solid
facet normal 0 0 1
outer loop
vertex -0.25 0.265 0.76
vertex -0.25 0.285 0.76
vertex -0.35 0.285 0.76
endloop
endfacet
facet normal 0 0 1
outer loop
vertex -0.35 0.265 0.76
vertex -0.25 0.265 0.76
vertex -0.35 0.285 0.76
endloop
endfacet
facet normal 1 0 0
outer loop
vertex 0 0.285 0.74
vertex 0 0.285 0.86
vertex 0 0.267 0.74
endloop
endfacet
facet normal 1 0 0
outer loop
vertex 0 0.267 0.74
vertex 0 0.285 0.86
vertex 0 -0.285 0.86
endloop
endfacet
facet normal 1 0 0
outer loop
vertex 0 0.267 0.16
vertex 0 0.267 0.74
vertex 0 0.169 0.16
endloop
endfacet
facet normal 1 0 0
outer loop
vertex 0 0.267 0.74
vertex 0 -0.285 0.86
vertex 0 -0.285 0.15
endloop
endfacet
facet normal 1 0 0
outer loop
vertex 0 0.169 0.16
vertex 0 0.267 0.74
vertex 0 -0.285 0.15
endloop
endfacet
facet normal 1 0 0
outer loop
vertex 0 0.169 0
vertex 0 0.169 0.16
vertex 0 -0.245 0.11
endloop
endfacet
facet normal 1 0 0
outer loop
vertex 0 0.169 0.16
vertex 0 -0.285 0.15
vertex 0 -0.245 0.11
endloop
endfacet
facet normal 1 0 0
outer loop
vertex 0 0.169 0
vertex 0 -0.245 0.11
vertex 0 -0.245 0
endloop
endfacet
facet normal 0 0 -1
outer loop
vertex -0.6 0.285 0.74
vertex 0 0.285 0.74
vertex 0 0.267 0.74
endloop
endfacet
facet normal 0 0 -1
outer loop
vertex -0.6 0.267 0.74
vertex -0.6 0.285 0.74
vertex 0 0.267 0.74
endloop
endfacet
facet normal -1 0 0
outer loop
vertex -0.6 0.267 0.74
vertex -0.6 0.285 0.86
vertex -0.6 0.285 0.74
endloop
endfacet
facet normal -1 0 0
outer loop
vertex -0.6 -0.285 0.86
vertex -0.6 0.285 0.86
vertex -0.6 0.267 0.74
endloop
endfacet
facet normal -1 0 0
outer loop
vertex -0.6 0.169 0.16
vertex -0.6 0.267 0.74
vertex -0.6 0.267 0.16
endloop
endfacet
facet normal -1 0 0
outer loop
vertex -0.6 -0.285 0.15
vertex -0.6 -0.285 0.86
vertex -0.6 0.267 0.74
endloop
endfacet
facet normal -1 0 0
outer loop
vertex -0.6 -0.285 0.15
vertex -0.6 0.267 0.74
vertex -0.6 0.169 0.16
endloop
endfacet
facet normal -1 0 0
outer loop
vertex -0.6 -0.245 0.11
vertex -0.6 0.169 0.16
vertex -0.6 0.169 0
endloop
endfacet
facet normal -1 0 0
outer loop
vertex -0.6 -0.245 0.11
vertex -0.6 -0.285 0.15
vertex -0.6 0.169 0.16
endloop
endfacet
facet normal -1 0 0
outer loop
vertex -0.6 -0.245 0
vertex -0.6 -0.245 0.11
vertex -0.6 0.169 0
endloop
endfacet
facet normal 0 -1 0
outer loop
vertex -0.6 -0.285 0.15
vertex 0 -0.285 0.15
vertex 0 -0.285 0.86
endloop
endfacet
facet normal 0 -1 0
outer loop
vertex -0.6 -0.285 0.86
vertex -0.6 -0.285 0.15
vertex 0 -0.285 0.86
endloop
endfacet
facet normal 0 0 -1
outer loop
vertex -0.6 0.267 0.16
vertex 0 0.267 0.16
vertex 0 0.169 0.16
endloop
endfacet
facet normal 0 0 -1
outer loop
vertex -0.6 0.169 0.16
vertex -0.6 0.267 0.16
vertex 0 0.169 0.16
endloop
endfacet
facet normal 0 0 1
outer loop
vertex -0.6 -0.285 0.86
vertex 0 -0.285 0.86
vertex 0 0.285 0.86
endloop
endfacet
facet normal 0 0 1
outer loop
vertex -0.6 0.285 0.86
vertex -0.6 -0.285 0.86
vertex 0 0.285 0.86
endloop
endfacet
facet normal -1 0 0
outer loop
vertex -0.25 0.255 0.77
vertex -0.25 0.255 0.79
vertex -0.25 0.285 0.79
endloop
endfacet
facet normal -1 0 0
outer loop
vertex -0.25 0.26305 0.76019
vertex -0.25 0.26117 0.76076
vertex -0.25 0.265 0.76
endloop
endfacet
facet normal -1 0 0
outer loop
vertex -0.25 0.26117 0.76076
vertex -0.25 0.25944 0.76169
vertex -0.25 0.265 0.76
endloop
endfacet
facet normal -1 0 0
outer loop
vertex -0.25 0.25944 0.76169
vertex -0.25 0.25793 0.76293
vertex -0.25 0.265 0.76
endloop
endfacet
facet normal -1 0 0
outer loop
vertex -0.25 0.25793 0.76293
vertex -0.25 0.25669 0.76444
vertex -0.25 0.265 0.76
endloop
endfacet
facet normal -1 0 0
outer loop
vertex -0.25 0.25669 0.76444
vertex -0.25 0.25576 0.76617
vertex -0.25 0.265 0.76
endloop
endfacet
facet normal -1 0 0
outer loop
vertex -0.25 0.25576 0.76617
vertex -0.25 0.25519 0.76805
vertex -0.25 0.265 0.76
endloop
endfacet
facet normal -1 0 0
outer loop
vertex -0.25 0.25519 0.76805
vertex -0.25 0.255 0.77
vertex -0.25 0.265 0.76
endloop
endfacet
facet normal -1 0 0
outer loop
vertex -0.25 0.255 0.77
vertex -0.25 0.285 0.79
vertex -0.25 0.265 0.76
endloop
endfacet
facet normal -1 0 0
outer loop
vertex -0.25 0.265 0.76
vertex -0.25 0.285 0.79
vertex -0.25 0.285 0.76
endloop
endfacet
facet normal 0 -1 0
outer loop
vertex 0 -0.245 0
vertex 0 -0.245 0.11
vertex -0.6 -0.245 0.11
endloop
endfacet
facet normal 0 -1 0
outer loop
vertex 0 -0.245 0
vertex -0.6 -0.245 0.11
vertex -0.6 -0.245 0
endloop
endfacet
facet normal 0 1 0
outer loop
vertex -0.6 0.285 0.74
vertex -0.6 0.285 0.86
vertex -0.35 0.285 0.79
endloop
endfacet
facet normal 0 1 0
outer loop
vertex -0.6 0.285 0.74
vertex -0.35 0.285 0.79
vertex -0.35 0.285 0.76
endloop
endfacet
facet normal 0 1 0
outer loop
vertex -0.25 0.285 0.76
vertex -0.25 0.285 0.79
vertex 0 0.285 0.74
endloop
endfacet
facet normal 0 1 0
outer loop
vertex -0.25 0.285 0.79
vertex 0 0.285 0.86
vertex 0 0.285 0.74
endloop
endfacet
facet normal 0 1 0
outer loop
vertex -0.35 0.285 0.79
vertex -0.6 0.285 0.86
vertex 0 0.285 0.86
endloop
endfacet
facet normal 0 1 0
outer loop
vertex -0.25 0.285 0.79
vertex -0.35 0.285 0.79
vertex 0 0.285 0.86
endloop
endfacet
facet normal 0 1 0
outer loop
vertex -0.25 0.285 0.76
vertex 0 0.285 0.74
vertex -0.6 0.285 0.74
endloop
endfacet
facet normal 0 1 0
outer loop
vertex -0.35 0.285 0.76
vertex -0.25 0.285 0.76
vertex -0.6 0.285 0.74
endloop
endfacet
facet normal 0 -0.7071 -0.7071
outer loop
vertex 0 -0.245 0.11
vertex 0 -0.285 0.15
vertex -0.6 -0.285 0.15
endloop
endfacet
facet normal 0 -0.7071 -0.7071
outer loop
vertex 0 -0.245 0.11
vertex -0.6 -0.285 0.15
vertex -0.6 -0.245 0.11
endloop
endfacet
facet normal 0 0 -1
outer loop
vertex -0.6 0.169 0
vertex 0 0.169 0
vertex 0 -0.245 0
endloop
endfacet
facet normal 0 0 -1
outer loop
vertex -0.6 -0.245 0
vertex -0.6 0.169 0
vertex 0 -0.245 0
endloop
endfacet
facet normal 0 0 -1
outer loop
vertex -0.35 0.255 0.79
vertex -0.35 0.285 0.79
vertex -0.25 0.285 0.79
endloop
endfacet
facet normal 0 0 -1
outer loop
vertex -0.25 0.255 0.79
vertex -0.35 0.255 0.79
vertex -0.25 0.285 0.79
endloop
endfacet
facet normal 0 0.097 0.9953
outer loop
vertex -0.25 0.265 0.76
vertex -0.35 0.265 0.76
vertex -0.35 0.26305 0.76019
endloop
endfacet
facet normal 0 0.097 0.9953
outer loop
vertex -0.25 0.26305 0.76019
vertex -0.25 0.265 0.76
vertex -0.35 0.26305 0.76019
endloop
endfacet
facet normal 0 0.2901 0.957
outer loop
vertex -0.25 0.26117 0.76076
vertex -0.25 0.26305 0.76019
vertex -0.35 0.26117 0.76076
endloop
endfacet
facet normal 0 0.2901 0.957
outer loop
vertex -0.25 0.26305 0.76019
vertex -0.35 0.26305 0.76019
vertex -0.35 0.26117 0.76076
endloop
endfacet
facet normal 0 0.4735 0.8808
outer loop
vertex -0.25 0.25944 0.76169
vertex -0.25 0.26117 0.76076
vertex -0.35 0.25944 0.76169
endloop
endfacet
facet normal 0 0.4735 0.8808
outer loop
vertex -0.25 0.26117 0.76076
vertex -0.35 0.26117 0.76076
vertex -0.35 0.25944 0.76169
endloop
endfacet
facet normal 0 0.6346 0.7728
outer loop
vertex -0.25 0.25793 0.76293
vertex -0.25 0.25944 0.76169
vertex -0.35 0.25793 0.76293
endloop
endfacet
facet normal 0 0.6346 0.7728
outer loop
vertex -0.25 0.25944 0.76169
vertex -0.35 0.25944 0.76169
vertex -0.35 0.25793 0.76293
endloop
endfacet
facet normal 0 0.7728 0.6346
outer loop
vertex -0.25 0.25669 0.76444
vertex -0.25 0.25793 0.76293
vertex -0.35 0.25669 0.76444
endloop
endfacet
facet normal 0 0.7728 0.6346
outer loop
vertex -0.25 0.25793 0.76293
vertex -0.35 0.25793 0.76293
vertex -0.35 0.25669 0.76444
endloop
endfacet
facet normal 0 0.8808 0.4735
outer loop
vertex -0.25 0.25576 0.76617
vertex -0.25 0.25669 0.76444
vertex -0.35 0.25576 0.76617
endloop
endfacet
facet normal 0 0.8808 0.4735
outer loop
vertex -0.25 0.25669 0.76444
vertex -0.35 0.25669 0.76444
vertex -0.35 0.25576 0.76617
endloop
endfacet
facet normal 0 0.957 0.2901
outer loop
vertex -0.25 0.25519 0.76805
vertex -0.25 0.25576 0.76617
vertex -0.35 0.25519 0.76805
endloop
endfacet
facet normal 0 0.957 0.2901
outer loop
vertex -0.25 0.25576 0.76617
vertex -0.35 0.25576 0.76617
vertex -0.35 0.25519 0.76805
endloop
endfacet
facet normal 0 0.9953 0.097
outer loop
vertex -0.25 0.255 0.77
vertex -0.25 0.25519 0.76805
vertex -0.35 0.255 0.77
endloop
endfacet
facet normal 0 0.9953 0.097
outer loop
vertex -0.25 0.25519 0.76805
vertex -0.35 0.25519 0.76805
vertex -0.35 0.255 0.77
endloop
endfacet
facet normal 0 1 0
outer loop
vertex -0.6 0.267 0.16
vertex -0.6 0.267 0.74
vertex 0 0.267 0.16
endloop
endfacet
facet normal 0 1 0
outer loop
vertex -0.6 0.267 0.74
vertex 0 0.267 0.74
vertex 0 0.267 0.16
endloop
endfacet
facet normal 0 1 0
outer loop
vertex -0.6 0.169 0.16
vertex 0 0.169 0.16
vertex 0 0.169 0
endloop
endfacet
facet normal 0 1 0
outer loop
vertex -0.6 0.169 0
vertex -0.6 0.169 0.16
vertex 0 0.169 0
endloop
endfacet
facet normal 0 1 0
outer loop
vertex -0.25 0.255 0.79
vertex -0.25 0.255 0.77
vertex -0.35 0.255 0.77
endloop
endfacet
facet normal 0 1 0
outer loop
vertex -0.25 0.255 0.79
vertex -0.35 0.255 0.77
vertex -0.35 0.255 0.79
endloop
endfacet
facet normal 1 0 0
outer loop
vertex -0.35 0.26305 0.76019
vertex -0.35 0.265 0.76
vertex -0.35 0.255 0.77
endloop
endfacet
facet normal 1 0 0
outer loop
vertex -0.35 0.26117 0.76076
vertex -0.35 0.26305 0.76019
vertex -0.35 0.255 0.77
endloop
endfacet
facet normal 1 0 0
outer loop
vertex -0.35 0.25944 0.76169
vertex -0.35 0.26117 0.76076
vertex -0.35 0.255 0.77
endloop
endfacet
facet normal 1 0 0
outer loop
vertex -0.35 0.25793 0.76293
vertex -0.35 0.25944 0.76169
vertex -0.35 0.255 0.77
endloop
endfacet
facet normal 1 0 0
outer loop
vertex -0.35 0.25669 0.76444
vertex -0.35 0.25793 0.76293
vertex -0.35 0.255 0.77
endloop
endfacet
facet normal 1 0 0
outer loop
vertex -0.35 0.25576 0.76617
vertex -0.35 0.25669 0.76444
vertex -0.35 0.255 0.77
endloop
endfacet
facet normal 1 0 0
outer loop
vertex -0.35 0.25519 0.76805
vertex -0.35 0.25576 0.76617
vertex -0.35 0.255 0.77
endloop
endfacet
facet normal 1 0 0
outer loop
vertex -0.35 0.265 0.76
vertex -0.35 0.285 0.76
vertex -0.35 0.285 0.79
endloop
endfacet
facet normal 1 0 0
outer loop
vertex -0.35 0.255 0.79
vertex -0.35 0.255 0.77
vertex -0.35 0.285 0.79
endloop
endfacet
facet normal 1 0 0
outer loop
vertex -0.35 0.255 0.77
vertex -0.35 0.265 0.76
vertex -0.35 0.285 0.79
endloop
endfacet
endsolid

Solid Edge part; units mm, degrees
sketch "Sketch1" plane through (0, 0, 0) normal (1, 0, 0) x (0, 1, 0)
  line L0 (-0.285, 0.86) -> (0.285, 0.86)
  line L1 (0.285, 0.86) -> (0.285, 0.74)
  line L2 (0.285, 0.74) -> (0.267, 0.74)
  line L3 (0.267, 0.74) -> (0.267, 0.16)
  line L4 (0.267, 0.16) -> (0.169, 0.16)
  line L5 (0.169, 0.16) -> (0.169, 0)
  line L6 (0.169, 0) -> (-0.245, 0)
  line L7 (-0.245, 0.11) -> (-0.245, 0)
  line L8 (-0.285, 0.15) -> (-0.245, 0.11)
  line L9 (-0.285, 0.15) -> (-0.285, 0.86)
  dimension "D1" = 0.12
  dimension "D2" = 0.57
  dimension "D3" = 0.04
  dimension "D4" = 0.15
  dimension "D5" = 0.16
  dimension "D6" = 0.116
  dimension "D7" = 0.018
extrude "Protrusion1" add sketch "Sketch1" against normal blind 0.6
sketch "Sketch2" plane through (-0.298, 0.285, 0.8) normal (0, 1, 0) x (-1, 0, 0)
  line L0 (-0.048, -0.04) -> (0.052, -0.04)
  line L1 (0.052, -0.04) -> (0.052, -0.01)
  line L2 (0.052, -0.01) -> (-0.048, -0.01)
  line L3 (-0.048, -0.01) -> (-0.048, -0.04)
  dimension "D1" = 0.1
  dimension "D2" = 0.03
  dimension "D3" = 0.07
  dimension "D4" = 0.3
extrude "Ausschnitt_1" cut sketch "Sketch2" against normal blind 0.03
fillet "Verrundung_1" radius 0.01 1 edges at (-0.3, 0.255, 0.76)
